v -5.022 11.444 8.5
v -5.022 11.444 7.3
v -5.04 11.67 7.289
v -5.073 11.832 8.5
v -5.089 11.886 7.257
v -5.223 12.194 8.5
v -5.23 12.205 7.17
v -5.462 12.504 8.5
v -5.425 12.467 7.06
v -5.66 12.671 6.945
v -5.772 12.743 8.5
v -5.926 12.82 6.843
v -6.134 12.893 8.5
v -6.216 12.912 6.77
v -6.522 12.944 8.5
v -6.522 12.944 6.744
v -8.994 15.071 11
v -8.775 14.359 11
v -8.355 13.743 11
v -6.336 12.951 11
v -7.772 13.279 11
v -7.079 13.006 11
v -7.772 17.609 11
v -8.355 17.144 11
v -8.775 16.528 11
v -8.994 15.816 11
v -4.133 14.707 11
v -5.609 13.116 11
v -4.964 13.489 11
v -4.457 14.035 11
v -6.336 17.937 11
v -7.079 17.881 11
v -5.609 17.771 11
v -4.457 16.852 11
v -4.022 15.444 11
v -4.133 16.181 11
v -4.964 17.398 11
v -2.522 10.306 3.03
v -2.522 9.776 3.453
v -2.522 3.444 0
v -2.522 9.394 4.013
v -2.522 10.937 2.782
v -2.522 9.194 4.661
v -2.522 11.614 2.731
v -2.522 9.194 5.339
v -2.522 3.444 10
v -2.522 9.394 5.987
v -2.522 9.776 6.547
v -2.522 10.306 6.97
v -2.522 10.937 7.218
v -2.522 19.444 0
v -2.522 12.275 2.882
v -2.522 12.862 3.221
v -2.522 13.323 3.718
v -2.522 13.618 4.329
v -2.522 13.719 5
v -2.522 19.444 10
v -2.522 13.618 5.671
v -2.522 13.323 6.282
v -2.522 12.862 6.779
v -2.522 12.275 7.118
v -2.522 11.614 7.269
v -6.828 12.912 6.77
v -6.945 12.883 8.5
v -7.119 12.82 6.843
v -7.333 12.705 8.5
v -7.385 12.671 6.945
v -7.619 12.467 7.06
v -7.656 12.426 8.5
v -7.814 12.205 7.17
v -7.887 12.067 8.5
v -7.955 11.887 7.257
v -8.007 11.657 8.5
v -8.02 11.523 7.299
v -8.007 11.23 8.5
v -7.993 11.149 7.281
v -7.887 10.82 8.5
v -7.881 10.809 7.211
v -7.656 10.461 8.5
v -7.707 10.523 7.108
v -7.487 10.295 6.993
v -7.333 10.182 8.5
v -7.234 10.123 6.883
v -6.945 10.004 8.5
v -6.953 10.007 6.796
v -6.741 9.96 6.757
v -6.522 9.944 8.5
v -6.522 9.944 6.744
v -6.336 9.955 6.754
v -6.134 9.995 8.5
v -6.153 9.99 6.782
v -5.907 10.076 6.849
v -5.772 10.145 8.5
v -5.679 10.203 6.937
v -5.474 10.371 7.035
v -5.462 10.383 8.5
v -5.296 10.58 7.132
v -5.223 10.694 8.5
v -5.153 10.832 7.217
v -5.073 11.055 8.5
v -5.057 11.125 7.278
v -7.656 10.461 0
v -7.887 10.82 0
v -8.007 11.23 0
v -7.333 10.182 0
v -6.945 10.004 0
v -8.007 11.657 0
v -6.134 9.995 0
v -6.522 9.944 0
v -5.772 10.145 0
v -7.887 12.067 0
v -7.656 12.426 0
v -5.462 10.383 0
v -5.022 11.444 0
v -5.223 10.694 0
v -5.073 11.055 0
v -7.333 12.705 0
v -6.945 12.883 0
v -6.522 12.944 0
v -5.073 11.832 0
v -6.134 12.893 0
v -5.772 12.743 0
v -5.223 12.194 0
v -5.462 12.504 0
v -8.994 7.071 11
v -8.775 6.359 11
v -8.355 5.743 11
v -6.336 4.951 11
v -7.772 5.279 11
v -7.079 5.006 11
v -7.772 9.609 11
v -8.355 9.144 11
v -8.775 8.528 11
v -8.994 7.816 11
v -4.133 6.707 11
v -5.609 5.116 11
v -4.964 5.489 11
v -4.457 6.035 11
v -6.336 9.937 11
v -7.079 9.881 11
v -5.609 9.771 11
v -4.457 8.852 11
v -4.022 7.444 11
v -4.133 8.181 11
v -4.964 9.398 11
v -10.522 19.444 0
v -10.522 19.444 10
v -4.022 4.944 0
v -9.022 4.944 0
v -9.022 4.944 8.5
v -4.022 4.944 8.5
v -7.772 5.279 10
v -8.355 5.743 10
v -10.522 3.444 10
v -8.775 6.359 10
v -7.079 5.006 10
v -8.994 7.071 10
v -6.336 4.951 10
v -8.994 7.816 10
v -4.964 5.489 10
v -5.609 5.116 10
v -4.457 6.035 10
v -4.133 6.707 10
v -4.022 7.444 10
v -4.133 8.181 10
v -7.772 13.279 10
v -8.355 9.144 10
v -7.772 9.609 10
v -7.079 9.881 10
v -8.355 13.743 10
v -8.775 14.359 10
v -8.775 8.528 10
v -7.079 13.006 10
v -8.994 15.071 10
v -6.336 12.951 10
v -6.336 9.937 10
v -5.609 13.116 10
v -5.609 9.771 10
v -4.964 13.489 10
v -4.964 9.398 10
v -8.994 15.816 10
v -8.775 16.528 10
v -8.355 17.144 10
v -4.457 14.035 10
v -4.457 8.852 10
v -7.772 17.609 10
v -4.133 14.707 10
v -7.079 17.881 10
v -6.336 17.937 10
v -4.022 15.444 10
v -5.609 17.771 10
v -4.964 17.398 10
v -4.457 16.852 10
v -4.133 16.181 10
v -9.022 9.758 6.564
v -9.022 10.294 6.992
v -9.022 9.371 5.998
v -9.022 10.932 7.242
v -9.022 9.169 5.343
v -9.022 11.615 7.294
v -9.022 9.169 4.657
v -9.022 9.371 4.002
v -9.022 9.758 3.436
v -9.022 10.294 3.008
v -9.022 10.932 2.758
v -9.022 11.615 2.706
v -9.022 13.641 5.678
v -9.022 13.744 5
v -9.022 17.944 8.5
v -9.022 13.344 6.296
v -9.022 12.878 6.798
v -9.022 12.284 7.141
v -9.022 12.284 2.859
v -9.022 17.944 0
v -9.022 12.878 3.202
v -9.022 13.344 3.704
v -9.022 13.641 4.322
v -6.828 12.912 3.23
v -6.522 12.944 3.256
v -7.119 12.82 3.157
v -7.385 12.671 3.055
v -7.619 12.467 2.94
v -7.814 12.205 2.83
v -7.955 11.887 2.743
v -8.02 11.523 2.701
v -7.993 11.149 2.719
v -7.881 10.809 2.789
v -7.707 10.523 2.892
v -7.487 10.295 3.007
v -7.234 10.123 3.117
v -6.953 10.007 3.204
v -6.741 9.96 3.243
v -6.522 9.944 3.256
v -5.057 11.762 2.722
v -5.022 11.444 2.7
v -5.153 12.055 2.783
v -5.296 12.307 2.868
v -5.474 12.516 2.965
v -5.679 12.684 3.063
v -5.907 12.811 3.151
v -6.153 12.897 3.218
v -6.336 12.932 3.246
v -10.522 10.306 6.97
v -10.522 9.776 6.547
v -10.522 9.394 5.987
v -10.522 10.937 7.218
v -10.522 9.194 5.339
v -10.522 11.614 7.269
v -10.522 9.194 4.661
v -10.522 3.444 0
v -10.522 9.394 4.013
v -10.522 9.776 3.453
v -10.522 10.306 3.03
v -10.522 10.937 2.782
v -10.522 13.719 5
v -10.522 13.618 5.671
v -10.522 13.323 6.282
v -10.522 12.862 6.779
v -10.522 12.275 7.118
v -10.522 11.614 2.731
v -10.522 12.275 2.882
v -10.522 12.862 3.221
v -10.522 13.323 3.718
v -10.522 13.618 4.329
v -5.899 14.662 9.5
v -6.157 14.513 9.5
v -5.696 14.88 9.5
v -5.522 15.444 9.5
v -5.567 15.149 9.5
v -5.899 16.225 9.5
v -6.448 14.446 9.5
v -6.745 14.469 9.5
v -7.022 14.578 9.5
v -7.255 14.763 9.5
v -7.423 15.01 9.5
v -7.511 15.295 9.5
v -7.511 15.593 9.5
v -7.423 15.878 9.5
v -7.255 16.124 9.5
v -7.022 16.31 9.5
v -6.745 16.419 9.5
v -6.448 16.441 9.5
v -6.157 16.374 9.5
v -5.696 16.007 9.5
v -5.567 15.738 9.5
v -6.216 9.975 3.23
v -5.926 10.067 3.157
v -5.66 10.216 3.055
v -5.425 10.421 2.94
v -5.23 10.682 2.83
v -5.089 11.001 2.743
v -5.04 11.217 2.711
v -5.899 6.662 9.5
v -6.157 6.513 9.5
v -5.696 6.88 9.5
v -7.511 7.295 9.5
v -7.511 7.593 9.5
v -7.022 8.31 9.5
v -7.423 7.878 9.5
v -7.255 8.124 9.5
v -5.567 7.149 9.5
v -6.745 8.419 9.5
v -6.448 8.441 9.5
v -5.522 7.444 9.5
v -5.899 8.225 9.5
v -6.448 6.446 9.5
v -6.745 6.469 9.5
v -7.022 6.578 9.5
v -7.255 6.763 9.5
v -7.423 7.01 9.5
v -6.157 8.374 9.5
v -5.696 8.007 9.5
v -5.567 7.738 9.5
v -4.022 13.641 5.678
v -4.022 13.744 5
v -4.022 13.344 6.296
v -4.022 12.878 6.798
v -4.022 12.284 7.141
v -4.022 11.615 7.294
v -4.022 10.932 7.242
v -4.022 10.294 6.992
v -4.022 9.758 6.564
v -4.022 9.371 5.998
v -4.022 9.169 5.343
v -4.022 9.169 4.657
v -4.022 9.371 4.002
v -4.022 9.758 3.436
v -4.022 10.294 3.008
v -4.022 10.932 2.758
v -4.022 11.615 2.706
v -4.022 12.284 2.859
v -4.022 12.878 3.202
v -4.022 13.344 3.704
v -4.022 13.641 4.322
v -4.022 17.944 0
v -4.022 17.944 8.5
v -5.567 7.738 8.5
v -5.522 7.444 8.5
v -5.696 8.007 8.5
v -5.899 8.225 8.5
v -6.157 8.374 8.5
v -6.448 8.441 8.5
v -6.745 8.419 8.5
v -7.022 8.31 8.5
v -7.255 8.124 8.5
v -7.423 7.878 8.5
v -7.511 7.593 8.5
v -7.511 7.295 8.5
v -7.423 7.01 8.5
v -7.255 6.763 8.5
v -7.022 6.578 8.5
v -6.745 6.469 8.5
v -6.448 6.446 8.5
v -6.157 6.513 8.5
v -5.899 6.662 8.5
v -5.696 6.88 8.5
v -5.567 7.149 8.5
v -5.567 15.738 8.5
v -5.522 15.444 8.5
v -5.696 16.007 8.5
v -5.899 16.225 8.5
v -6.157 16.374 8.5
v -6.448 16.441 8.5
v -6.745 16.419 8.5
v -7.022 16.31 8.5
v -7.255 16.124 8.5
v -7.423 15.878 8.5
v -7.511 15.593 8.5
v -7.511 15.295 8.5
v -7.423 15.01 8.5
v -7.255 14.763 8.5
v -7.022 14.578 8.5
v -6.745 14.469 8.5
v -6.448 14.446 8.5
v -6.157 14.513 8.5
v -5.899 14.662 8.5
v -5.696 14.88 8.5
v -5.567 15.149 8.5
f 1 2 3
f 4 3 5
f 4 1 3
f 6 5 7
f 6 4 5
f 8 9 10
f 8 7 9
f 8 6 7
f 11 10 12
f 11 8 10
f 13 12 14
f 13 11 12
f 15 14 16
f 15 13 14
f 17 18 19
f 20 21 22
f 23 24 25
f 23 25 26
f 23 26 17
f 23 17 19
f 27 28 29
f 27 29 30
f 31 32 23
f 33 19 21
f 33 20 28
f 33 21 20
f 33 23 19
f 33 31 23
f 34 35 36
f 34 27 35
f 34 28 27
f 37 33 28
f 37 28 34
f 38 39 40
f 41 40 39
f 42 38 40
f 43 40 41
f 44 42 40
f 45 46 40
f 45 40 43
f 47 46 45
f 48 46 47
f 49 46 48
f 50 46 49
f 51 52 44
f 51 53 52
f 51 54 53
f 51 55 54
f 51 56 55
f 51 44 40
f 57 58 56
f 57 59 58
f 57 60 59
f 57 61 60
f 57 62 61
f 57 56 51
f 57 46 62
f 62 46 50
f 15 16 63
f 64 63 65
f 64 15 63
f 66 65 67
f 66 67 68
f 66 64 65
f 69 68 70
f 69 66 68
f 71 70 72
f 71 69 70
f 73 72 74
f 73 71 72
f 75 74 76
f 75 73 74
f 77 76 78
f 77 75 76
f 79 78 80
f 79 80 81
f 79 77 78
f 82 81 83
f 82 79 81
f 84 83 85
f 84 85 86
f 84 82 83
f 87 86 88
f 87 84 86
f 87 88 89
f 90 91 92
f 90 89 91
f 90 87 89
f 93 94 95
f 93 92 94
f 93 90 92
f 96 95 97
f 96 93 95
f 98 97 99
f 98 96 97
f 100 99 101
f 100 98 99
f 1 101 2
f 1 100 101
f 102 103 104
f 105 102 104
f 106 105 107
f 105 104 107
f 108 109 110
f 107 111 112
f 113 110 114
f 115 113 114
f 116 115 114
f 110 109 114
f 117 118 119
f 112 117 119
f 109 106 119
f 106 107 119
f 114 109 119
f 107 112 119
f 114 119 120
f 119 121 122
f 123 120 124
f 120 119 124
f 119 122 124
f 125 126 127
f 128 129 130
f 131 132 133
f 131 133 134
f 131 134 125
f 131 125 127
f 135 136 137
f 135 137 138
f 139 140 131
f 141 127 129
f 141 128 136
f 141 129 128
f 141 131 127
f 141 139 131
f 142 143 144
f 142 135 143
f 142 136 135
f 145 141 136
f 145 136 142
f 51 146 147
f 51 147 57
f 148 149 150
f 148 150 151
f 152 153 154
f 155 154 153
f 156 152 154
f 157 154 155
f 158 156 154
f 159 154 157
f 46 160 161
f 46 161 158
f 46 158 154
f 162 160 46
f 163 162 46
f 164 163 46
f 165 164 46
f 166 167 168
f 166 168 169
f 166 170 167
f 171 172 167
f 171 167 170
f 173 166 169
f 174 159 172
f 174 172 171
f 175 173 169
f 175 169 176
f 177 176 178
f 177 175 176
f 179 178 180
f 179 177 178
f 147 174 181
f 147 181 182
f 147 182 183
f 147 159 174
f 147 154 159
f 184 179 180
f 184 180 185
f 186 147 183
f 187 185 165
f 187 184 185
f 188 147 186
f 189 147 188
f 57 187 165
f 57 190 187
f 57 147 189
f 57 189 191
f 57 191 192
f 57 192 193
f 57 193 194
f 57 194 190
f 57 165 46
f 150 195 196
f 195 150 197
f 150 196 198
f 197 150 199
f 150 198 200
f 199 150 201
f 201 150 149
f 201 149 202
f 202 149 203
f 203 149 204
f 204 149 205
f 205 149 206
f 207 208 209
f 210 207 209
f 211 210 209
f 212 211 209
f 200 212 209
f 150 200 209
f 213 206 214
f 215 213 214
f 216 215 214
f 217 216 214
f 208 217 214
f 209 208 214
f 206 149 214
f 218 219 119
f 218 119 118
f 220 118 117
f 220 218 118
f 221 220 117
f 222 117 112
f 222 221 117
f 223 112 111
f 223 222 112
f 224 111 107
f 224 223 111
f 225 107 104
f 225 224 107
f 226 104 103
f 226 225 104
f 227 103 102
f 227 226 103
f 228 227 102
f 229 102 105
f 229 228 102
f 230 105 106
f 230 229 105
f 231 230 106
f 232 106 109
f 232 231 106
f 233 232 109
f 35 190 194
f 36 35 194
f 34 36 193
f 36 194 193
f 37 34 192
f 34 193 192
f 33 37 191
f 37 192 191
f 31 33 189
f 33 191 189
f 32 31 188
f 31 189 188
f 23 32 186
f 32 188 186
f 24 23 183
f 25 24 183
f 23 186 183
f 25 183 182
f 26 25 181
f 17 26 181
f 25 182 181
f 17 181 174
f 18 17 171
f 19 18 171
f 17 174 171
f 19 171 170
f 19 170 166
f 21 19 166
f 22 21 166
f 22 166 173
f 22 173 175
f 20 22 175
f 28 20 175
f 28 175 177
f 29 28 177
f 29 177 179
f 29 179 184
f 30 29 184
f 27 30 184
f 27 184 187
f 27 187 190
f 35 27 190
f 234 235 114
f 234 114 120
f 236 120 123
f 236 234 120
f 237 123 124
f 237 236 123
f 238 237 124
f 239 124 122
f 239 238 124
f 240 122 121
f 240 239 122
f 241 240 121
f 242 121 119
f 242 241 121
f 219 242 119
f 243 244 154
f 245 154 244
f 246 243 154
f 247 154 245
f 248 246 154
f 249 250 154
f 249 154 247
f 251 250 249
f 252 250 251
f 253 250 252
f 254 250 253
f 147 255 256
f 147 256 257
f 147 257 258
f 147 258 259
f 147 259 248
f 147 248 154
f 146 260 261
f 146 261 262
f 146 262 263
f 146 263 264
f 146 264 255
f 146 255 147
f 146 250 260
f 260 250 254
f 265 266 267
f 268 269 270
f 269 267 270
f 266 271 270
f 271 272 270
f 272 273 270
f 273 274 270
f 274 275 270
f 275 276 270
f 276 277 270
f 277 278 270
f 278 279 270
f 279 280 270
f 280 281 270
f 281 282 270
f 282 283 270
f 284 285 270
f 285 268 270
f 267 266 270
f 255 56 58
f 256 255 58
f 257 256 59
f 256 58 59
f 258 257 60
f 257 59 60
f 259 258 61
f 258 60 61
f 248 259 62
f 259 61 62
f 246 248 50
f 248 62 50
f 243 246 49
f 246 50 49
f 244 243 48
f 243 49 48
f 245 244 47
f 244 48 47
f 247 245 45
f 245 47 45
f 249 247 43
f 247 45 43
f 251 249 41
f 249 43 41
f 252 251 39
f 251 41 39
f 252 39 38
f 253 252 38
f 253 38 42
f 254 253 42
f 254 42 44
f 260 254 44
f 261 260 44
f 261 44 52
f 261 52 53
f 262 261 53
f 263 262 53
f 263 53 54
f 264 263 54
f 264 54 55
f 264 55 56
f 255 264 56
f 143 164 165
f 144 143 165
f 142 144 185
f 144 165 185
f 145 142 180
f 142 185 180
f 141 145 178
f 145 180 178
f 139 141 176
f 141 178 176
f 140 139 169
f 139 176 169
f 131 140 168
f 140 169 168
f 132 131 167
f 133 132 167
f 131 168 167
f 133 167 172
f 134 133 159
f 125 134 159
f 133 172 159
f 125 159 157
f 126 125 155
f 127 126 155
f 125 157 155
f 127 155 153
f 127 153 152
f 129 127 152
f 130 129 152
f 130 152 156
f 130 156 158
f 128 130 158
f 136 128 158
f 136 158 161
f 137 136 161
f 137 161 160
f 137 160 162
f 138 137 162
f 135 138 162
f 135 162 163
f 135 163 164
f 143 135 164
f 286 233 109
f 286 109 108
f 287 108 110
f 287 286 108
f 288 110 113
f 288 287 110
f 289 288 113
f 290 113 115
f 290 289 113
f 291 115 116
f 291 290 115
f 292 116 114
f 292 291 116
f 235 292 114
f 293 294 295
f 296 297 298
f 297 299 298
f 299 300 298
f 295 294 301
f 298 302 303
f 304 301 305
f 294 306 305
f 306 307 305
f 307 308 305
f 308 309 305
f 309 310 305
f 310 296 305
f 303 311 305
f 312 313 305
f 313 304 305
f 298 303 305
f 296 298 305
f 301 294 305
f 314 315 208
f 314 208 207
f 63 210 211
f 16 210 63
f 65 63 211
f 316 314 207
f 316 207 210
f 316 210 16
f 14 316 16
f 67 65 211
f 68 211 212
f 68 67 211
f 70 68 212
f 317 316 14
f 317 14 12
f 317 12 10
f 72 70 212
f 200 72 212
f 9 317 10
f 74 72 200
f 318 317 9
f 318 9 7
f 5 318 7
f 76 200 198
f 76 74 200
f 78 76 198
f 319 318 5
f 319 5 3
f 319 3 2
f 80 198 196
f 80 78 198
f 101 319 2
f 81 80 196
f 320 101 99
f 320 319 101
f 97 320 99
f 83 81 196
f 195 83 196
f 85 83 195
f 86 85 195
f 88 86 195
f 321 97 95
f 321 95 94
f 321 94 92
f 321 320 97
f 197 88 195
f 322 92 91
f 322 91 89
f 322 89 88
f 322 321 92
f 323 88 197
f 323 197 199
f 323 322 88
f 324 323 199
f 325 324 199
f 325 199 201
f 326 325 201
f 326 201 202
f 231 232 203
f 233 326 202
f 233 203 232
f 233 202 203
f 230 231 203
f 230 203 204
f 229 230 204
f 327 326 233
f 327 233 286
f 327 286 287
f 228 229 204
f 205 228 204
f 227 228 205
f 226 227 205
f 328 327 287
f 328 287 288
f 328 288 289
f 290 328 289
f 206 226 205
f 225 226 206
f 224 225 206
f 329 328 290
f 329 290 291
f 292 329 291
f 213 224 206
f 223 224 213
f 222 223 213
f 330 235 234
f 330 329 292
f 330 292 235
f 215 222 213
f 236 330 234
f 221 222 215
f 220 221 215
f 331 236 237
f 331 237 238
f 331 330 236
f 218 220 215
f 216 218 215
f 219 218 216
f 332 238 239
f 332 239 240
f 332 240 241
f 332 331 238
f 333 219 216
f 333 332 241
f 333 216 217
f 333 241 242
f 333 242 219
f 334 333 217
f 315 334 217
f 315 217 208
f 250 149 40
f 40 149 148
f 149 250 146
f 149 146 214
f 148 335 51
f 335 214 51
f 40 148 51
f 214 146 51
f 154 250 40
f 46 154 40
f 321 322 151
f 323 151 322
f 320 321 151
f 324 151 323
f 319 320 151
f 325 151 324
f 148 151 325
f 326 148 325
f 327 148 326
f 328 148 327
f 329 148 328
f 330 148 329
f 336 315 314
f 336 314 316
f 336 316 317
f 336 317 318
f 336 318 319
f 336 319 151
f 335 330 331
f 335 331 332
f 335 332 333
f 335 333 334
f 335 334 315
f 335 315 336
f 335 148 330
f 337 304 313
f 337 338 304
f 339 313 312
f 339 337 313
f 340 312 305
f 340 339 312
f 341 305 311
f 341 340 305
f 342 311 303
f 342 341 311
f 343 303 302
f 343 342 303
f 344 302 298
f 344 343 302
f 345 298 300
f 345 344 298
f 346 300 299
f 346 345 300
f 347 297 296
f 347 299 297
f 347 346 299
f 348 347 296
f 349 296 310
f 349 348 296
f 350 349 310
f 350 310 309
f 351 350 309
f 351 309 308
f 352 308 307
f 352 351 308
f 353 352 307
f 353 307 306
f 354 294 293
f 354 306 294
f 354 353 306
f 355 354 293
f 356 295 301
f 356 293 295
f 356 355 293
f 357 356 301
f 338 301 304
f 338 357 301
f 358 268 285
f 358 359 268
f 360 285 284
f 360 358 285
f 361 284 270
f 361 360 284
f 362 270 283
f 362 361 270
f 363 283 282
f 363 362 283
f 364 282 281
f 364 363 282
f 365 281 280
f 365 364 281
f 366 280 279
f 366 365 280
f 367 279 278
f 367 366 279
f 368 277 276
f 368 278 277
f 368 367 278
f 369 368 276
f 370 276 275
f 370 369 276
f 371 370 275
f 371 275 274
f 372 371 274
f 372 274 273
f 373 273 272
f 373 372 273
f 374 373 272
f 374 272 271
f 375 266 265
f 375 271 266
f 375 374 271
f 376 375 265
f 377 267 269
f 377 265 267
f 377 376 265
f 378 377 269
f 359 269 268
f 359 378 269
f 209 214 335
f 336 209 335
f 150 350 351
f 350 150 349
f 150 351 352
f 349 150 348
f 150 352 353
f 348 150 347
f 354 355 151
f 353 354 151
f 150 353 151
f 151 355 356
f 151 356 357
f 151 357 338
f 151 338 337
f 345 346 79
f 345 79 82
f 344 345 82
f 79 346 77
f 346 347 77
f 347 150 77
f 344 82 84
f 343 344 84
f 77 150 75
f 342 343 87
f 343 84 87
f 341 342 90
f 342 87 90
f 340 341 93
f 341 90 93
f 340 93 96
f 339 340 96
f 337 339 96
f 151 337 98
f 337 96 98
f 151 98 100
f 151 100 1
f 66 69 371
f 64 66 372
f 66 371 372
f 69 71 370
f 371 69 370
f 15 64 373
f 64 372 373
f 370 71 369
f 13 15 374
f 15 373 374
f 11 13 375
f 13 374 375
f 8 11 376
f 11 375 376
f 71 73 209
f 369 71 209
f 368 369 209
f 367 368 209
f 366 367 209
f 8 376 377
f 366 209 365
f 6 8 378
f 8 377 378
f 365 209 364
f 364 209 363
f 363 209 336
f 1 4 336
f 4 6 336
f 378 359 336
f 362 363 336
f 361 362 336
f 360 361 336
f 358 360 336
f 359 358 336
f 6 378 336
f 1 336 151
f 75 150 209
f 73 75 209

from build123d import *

# Parameters (mm, degrees)
F0_W     = 8
F0_H     = 16
F1_DEPTH = 10
F2_R     = 2.5
F3_DEPTH = 1
F4_T     = -1.5
F6_DEPTH = 10
F7_R     = 2.3
F7_R_2   = 2.275
F8_DEPTH = 8
F9_DEPTH = 8


with BuildPart() as f1:
    # F0 (on Top) → F1 (new body)
    with BuildSketch(Plane.XY):
        with Locations((-6.5223464929, 11.4436195551)):
            Rectangle(F0_W, F0_H)
    extrude(amount=F1_DEPTH)

    # F2 (on face) → F3 (join)
    with BuildSketch(Plane.XY.offset(10)):
        with Locations((-6.5223464929, 7.4436195551)):
            Circle(F2_R)
        with Locations((-6.5223464929, 15.4436195551)):
            Circle(F2_R)
    extrude(amount=F3_DEPTH)

    # F4
    f4_openings = [f1.faces().sort_by_distance(p)[0] for p in [
        (-6.522346, 11.44362, 0),
    ]]
    offset(amount=F4_T, openings=f4_openings, kind=Kind.INTERSECTION)

    # F5 (on face) → F6 (join)
    with BuildSketch(Plane.XY.offset(10)):
        with BuildLine():
            ThreePointArc((-6.5223464929, 9.9436195551), (-5.4616863211, 10.3829593833), (-5.0223464929, 11.4436195551))
            ThreePointArc((-5.0223464929, 11.4436195551), (-5.4616863203, 12.5042797261), (-6.5223464908, 12.9436195551))
            ThreePointArc((-6.5223464908, 12.9436195551), (-8.0223464929, 11.4436195561), (-6.5223464929, 9.9436195551))
        make_face()
    extrude(amount=-F6_DEPTH)

    # F7 (on face) → F8 (join)
    with BuildSketch(Plane.YZ.offset(-2.5223464929)):
        with Locations((11.4436195551, 5)):
            Circle(F7_R)
        with Locations((11.4436195551, 5)):
            Circle(F7_R_2, mode=Mode.SUBTRACT)
    extrude(amount=-F8_DEPTH)

    # F7 (on face) → F9 (cut)
    with BuildSketch(Plane.YZ.offset(-2.5223464929)):
        with Locations((11.4436195551, 5)):
            Circle(F7_R_2)
    extrude(amount=-F9_DEPTH, mode=Mode.SUBTRACT)


solid = f1.part
